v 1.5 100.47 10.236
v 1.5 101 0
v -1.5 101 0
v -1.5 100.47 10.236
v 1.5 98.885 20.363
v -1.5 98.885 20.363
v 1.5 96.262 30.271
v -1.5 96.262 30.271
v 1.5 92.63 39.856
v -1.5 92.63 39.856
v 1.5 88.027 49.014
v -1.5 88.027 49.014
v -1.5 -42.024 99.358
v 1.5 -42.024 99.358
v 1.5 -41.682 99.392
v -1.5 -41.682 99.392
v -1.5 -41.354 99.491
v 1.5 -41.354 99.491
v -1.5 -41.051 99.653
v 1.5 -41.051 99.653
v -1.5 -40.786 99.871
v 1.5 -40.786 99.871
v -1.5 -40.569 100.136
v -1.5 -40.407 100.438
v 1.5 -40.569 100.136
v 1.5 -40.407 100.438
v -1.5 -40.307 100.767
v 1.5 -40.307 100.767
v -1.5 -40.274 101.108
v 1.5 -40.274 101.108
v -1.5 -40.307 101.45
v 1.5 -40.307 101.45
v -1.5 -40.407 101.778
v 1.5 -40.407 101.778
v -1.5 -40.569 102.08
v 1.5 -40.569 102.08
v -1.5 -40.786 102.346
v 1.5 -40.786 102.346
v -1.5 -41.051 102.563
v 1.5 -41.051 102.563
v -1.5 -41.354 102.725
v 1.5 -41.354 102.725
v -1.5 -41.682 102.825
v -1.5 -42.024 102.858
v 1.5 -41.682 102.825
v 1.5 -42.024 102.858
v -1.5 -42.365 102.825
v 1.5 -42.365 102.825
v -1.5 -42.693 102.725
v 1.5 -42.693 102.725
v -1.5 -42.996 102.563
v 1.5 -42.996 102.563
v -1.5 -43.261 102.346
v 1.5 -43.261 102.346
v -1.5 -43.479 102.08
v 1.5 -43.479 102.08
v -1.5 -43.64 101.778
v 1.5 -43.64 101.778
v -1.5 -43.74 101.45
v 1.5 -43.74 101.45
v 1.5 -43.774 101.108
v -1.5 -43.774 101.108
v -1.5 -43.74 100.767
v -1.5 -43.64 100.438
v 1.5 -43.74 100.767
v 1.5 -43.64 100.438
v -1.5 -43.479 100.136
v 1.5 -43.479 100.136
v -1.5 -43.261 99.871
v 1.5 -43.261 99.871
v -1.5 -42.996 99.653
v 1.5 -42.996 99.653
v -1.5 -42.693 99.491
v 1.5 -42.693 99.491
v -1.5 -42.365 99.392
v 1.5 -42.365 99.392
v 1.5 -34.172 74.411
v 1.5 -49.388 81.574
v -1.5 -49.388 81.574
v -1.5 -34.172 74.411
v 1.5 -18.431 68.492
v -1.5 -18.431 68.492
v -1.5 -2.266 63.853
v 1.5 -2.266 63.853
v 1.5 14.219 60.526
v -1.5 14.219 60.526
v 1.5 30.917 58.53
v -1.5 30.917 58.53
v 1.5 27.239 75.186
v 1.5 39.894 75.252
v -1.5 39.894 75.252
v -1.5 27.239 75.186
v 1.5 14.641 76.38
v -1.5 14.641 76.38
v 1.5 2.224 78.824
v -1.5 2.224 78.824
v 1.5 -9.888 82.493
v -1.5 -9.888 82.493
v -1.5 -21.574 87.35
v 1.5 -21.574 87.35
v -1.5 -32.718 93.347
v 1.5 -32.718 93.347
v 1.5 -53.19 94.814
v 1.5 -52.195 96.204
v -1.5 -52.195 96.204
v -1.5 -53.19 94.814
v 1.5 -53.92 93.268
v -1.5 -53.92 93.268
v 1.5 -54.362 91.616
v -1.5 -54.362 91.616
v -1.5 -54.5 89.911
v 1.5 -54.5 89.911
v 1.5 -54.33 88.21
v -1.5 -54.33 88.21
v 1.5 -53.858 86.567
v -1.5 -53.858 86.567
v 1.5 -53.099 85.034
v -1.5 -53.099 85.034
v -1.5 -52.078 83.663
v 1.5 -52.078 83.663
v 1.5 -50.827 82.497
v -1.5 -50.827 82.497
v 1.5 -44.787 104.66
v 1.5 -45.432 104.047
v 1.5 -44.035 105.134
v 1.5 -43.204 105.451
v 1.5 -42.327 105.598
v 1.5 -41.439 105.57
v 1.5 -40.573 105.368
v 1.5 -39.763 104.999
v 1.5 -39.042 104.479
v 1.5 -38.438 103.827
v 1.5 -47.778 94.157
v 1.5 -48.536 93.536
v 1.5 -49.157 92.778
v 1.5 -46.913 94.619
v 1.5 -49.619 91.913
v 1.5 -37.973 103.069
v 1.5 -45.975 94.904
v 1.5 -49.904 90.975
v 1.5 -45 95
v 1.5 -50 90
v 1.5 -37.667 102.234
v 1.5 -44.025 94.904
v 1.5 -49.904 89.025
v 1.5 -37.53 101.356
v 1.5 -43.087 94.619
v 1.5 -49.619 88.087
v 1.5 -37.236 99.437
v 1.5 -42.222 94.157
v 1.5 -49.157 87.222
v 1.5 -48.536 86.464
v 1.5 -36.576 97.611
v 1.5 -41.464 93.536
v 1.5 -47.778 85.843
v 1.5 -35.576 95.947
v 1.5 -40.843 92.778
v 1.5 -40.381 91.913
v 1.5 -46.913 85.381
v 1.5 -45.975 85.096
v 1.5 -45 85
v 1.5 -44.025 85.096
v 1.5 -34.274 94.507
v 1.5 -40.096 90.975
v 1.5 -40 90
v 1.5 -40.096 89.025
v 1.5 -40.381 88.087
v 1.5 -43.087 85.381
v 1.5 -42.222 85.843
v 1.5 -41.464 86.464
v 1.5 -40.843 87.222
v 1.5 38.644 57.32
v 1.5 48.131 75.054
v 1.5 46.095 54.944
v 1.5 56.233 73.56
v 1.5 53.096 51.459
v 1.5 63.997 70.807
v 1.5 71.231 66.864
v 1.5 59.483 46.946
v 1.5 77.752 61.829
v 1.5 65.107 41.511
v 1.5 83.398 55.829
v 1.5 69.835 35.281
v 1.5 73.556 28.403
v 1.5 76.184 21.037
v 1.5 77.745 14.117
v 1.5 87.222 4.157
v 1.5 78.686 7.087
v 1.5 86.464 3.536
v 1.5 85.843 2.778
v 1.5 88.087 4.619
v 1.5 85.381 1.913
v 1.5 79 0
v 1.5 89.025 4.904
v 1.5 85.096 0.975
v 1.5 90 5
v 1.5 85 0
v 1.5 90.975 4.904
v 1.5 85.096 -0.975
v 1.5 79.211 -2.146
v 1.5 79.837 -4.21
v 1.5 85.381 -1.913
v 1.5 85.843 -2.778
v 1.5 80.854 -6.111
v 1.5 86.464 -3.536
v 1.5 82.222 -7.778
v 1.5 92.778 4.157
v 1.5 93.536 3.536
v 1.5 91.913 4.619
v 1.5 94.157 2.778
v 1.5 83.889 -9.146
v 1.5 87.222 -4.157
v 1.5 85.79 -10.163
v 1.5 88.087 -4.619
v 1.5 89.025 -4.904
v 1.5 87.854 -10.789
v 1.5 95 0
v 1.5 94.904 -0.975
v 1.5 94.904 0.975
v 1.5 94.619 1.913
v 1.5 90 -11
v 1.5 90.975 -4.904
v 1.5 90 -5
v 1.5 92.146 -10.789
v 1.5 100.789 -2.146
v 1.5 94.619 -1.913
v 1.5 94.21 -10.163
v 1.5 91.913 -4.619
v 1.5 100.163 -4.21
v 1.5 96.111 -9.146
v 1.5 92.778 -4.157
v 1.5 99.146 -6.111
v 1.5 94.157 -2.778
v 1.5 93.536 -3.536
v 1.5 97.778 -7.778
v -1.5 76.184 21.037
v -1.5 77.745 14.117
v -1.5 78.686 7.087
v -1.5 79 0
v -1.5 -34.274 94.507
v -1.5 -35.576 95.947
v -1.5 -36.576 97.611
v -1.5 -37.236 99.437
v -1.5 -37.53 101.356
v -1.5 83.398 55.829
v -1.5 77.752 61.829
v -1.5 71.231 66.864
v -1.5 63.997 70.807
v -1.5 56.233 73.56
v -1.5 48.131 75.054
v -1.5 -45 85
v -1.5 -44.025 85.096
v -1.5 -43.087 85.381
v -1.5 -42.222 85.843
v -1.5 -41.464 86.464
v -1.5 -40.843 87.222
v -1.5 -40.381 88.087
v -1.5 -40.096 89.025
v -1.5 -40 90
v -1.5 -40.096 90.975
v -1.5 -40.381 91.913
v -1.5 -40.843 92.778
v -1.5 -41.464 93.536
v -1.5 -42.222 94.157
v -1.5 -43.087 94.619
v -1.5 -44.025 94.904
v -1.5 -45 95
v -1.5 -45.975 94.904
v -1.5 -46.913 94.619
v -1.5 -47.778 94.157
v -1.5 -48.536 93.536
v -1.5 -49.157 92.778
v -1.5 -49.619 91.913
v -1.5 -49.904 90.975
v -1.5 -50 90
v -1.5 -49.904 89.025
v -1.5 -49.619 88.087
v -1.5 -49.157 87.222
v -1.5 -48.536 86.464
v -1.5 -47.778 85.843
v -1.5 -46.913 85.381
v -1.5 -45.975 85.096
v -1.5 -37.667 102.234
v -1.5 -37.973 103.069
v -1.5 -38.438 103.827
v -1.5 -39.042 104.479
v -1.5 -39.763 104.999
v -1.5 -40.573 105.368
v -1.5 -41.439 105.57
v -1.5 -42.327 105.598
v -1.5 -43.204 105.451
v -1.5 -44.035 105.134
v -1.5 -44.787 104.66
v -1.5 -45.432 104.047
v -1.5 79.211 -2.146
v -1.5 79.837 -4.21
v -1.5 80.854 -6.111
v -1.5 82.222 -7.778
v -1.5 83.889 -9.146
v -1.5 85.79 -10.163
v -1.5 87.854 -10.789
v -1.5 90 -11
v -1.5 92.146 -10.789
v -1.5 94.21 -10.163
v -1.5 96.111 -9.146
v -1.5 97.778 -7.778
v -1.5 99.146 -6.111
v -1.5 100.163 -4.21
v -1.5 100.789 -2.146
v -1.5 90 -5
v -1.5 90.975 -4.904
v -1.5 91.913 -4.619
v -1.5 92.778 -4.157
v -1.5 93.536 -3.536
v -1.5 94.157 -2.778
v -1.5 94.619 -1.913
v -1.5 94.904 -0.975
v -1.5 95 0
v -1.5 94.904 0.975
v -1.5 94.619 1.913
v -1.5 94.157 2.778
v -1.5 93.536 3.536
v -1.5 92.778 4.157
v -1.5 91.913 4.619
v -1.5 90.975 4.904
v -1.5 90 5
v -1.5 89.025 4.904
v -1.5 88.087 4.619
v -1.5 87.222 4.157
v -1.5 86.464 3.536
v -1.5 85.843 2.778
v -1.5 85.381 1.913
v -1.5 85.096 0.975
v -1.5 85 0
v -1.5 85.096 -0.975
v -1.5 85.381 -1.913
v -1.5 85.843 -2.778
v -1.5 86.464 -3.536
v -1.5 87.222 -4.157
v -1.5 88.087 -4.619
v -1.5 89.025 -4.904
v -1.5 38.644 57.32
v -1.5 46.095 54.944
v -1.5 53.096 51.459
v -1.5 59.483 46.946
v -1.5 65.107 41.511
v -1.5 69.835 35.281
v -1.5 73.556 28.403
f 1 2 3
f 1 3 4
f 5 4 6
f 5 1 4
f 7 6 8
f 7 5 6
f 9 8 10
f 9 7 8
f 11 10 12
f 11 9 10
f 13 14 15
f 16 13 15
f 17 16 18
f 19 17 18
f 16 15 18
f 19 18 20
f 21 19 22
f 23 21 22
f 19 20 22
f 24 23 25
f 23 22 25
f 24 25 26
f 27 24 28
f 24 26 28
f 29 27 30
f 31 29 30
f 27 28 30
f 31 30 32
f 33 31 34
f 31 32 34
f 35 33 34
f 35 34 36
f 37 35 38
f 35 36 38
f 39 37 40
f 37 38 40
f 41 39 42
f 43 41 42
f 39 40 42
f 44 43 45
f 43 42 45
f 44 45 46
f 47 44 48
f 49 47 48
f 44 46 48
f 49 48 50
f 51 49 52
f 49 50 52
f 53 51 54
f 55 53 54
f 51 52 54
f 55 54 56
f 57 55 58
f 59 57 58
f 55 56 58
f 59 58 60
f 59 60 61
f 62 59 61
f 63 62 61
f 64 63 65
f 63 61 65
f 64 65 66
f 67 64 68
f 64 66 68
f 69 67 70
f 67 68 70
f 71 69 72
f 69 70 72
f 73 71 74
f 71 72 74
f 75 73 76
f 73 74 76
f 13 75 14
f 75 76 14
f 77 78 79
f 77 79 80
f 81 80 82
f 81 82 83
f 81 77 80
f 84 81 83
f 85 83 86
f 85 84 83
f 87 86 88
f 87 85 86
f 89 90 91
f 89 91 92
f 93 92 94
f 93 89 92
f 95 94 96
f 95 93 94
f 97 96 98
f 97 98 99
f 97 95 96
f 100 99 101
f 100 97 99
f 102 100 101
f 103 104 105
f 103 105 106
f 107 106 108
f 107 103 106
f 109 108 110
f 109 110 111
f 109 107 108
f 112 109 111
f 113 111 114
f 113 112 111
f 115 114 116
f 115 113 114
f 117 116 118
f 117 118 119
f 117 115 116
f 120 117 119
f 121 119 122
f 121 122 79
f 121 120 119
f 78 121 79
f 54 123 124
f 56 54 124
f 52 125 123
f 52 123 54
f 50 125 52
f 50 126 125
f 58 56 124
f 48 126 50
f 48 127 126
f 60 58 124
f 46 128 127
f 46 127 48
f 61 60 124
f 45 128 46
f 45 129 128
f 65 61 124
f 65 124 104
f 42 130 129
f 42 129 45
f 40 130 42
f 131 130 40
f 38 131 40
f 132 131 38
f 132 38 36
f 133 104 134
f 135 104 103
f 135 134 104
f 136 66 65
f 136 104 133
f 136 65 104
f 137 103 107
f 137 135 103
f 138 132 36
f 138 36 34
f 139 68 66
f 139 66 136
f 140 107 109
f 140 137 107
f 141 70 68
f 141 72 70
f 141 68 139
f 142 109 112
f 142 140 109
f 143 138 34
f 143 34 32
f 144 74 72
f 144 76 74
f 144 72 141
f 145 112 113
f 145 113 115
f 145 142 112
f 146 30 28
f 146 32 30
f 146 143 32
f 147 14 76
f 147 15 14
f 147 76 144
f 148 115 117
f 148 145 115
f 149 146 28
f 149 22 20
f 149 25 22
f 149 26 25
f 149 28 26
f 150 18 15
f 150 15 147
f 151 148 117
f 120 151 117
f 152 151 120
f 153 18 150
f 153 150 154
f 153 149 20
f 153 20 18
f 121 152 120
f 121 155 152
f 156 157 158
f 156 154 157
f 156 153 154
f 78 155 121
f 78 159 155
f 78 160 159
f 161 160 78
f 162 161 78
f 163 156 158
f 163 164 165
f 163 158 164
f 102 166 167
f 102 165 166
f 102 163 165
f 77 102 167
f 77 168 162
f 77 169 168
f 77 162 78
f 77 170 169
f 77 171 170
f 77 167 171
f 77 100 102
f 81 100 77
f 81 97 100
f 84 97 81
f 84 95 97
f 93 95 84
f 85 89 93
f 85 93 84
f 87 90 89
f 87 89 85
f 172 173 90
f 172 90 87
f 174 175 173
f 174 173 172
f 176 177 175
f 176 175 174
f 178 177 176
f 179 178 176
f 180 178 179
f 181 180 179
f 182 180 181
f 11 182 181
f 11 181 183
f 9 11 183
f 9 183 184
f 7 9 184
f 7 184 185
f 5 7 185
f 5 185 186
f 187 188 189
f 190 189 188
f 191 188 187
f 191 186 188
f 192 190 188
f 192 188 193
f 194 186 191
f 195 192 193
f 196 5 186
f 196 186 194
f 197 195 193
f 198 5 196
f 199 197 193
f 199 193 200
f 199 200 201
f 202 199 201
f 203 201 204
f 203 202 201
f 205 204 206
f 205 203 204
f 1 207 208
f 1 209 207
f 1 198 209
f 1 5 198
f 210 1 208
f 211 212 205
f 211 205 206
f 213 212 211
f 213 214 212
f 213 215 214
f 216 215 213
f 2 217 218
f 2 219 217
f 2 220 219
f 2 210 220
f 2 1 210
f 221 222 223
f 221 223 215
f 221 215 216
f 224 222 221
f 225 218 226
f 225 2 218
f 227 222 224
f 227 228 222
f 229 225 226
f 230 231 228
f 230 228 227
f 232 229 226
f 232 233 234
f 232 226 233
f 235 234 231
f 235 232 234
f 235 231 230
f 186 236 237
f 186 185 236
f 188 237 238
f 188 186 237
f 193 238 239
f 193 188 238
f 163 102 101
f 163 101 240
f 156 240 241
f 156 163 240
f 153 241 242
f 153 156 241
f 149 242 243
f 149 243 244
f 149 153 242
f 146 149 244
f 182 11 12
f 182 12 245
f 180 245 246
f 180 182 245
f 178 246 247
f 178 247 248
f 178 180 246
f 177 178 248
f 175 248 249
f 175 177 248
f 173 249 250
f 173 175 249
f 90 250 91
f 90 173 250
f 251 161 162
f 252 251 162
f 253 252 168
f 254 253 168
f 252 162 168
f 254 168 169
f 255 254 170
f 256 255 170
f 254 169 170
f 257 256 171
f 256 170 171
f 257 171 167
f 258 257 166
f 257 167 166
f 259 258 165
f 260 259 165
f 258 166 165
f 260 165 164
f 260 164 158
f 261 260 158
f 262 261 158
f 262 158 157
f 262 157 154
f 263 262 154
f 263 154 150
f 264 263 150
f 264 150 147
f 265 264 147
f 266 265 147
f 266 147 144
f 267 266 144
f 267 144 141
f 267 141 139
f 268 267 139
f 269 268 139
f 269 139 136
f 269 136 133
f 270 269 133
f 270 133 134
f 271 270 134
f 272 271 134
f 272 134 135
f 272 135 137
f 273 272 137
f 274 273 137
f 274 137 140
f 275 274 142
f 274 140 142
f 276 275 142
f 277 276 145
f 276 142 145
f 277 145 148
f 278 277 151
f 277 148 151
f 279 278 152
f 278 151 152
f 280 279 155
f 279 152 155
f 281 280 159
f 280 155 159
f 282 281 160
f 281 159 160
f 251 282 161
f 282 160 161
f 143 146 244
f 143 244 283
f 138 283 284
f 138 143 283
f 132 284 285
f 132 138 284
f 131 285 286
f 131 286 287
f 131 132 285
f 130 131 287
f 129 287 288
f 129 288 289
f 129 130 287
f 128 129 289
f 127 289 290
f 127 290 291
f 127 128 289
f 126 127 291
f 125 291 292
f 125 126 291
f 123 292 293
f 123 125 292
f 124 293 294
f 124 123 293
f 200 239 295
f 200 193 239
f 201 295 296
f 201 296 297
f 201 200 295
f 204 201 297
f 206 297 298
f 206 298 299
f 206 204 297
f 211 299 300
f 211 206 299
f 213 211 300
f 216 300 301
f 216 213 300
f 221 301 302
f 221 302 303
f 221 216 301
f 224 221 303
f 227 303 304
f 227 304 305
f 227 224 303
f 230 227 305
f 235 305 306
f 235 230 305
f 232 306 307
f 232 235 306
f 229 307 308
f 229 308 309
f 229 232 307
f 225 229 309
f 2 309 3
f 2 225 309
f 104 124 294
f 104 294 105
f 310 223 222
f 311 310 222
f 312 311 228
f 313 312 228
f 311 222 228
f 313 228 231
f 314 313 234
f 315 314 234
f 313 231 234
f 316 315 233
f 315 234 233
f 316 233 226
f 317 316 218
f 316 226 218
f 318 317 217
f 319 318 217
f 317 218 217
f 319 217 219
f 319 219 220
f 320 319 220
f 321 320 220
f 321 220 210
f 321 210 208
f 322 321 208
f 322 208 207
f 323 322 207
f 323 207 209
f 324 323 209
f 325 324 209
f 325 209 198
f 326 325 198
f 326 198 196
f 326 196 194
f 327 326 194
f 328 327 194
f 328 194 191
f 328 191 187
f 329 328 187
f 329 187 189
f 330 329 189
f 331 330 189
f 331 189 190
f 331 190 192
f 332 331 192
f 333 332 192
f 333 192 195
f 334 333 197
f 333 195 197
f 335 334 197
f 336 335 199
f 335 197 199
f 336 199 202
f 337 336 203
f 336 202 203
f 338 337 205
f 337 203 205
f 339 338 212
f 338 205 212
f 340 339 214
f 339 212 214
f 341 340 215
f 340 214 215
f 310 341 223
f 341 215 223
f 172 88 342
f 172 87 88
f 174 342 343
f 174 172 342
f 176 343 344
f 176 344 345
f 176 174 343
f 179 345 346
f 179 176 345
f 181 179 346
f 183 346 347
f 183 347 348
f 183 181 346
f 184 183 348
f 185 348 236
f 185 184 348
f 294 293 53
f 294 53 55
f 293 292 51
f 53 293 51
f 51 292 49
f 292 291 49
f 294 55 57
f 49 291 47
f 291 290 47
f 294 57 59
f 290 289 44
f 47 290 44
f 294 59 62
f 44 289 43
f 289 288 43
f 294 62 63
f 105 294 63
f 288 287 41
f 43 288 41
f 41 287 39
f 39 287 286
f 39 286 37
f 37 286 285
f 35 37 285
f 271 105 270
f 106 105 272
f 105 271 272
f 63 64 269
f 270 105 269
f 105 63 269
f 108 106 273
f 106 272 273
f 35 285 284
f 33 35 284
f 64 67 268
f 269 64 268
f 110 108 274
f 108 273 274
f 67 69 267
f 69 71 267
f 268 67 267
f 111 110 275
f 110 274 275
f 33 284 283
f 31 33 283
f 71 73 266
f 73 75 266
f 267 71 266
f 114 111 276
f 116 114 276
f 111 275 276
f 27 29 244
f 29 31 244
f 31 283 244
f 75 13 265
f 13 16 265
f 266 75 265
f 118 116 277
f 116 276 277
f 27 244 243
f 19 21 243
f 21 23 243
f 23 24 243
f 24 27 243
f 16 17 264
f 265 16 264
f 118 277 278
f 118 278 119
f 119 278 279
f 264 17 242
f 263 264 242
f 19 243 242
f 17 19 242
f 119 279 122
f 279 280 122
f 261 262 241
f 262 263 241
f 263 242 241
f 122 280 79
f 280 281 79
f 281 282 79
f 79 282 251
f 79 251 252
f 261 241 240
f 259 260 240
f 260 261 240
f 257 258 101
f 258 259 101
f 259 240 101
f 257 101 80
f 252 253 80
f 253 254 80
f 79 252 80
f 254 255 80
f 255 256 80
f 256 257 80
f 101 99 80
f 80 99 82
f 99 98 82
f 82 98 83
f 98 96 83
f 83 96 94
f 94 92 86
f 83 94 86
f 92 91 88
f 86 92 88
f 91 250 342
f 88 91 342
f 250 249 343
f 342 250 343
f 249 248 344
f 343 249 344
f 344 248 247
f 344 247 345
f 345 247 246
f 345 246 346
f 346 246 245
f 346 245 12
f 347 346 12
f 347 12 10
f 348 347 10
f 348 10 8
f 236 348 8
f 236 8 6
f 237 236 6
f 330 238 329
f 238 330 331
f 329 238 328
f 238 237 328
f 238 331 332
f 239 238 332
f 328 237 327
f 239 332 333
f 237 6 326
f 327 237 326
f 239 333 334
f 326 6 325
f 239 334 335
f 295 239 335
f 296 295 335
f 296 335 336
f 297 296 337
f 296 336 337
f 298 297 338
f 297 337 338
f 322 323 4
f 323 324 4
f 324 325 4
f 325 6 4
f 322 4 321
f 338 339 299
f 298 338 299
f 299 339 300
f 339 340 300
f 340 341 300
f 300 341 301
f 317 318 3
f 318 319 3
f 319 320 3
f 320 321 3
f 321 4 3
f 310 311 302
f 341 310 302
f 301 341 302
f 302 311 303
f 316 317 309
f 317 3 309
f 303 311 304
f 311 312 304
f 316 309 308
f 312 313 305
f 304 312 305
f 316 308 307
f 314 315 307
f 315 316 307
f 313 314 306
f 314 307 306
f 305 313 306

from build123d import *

# Parameters (mm, degrees)
BOSS_EXTRUDE1_DEPTH = 1.5
SKETCH2_R           = 5
CUT_EXTRUDE1_DEPTH  = 142.810613143
SKETCH4_R           = 1.75
BOSS_EXTRUDE2_DEPTH = 3


with BuildPart() as part:
    # Sketch1 → Boss-Extrude1 (new, symmetric)
    with BuildSketch(Plane(origin=(0, 0, 0), x_dir=(0, 0, -1), z_dir=(1, 0, 0))):
        with BuildLine():
            ThreePointArc((0, 79), (11, 90), (0, 101))
            ThreePointArc((0, 101), (-25.350874614, 97.701945149), (-49.014054674, 88.027343403))
            ThreePointArc((-49.014054674, 88.027343403), (-68.978437503, 67.692387852), (-75.252234106, 39.89442974))
            ThreePointArc((-75.252234106, 39.89442974), (-79.876334442, -1.725579257), (-97.797422275, -39.573195612))
            ThreePointArc((-97.797422275, -39.573195612), (-94.917356951, -53.128320897), (-81.574017035, -49.387802533))
            ThreePointArc((-81.574017035, -49.387802533), (-66.010073659, -10.395208993), (-58.530464131, 30.917187762))
            ThreePointArc((-58.530464131, 30.917187762), (-46.946256543, 59.483246729), (-21.037120215, 76.184451628))
            ThreePointArc((-21.037120215, 76.184451628), (-10.612348227, 78.292988751), (0, 79))
        make_face()
    extrude(amount=BOSS_EXTRUDE1_DEPTH, both=True)

    # Sketch2 → Cut-Extrude1 (cut, through all)
    with BuildSketch(Plane(origin=(1.5, 0, 0), x_dir=(0, 0, -1), z_dir=(1, 0, 0))):
        with Locations((0, 90)):
            Circle(SKETCH2_R)
        with Locations((-90, -45)):
            Circle(SKETCH2_R)
    extrude(amount=-CUT_EXTRUDE1_DEPTH, mode=Mode.SUBTRACT)

    # Sketch4 → Boss-Extrude2 (add)
    with BuildSketch(Plane(origin=(1.5, 0, 0), x_dir=(0, 0, -1), z_dir=(1, 0, 0))):
        with BuildLine():
            Line((-104.046842635, -45.431522879), (-96.203913002, -52.194544007))
            ThreePointArc((-96.203913002, -52.194544007), (-96.739012984, -42.16802815), (-93.346869933, -32.717593358))
            ThreePointArc((-93.346869933, -32.717593358), (-96.754563068, -36.116875497), (-101.355592309, -37.530389374))
            ThreePointArc((-101.355592309, -37.530389374), (-105.36782436, -40.572667885), (-104.046842635, -45.431522879))
        make_face()
        with Locations((-101.108147002, -42.023580981)):
            Circle(SKETCH4_R, mode=Mode.SUBTRACT)
    extrude(amount=-BOSS_EXTRUDE2_DEPTH)


solid = part.part
